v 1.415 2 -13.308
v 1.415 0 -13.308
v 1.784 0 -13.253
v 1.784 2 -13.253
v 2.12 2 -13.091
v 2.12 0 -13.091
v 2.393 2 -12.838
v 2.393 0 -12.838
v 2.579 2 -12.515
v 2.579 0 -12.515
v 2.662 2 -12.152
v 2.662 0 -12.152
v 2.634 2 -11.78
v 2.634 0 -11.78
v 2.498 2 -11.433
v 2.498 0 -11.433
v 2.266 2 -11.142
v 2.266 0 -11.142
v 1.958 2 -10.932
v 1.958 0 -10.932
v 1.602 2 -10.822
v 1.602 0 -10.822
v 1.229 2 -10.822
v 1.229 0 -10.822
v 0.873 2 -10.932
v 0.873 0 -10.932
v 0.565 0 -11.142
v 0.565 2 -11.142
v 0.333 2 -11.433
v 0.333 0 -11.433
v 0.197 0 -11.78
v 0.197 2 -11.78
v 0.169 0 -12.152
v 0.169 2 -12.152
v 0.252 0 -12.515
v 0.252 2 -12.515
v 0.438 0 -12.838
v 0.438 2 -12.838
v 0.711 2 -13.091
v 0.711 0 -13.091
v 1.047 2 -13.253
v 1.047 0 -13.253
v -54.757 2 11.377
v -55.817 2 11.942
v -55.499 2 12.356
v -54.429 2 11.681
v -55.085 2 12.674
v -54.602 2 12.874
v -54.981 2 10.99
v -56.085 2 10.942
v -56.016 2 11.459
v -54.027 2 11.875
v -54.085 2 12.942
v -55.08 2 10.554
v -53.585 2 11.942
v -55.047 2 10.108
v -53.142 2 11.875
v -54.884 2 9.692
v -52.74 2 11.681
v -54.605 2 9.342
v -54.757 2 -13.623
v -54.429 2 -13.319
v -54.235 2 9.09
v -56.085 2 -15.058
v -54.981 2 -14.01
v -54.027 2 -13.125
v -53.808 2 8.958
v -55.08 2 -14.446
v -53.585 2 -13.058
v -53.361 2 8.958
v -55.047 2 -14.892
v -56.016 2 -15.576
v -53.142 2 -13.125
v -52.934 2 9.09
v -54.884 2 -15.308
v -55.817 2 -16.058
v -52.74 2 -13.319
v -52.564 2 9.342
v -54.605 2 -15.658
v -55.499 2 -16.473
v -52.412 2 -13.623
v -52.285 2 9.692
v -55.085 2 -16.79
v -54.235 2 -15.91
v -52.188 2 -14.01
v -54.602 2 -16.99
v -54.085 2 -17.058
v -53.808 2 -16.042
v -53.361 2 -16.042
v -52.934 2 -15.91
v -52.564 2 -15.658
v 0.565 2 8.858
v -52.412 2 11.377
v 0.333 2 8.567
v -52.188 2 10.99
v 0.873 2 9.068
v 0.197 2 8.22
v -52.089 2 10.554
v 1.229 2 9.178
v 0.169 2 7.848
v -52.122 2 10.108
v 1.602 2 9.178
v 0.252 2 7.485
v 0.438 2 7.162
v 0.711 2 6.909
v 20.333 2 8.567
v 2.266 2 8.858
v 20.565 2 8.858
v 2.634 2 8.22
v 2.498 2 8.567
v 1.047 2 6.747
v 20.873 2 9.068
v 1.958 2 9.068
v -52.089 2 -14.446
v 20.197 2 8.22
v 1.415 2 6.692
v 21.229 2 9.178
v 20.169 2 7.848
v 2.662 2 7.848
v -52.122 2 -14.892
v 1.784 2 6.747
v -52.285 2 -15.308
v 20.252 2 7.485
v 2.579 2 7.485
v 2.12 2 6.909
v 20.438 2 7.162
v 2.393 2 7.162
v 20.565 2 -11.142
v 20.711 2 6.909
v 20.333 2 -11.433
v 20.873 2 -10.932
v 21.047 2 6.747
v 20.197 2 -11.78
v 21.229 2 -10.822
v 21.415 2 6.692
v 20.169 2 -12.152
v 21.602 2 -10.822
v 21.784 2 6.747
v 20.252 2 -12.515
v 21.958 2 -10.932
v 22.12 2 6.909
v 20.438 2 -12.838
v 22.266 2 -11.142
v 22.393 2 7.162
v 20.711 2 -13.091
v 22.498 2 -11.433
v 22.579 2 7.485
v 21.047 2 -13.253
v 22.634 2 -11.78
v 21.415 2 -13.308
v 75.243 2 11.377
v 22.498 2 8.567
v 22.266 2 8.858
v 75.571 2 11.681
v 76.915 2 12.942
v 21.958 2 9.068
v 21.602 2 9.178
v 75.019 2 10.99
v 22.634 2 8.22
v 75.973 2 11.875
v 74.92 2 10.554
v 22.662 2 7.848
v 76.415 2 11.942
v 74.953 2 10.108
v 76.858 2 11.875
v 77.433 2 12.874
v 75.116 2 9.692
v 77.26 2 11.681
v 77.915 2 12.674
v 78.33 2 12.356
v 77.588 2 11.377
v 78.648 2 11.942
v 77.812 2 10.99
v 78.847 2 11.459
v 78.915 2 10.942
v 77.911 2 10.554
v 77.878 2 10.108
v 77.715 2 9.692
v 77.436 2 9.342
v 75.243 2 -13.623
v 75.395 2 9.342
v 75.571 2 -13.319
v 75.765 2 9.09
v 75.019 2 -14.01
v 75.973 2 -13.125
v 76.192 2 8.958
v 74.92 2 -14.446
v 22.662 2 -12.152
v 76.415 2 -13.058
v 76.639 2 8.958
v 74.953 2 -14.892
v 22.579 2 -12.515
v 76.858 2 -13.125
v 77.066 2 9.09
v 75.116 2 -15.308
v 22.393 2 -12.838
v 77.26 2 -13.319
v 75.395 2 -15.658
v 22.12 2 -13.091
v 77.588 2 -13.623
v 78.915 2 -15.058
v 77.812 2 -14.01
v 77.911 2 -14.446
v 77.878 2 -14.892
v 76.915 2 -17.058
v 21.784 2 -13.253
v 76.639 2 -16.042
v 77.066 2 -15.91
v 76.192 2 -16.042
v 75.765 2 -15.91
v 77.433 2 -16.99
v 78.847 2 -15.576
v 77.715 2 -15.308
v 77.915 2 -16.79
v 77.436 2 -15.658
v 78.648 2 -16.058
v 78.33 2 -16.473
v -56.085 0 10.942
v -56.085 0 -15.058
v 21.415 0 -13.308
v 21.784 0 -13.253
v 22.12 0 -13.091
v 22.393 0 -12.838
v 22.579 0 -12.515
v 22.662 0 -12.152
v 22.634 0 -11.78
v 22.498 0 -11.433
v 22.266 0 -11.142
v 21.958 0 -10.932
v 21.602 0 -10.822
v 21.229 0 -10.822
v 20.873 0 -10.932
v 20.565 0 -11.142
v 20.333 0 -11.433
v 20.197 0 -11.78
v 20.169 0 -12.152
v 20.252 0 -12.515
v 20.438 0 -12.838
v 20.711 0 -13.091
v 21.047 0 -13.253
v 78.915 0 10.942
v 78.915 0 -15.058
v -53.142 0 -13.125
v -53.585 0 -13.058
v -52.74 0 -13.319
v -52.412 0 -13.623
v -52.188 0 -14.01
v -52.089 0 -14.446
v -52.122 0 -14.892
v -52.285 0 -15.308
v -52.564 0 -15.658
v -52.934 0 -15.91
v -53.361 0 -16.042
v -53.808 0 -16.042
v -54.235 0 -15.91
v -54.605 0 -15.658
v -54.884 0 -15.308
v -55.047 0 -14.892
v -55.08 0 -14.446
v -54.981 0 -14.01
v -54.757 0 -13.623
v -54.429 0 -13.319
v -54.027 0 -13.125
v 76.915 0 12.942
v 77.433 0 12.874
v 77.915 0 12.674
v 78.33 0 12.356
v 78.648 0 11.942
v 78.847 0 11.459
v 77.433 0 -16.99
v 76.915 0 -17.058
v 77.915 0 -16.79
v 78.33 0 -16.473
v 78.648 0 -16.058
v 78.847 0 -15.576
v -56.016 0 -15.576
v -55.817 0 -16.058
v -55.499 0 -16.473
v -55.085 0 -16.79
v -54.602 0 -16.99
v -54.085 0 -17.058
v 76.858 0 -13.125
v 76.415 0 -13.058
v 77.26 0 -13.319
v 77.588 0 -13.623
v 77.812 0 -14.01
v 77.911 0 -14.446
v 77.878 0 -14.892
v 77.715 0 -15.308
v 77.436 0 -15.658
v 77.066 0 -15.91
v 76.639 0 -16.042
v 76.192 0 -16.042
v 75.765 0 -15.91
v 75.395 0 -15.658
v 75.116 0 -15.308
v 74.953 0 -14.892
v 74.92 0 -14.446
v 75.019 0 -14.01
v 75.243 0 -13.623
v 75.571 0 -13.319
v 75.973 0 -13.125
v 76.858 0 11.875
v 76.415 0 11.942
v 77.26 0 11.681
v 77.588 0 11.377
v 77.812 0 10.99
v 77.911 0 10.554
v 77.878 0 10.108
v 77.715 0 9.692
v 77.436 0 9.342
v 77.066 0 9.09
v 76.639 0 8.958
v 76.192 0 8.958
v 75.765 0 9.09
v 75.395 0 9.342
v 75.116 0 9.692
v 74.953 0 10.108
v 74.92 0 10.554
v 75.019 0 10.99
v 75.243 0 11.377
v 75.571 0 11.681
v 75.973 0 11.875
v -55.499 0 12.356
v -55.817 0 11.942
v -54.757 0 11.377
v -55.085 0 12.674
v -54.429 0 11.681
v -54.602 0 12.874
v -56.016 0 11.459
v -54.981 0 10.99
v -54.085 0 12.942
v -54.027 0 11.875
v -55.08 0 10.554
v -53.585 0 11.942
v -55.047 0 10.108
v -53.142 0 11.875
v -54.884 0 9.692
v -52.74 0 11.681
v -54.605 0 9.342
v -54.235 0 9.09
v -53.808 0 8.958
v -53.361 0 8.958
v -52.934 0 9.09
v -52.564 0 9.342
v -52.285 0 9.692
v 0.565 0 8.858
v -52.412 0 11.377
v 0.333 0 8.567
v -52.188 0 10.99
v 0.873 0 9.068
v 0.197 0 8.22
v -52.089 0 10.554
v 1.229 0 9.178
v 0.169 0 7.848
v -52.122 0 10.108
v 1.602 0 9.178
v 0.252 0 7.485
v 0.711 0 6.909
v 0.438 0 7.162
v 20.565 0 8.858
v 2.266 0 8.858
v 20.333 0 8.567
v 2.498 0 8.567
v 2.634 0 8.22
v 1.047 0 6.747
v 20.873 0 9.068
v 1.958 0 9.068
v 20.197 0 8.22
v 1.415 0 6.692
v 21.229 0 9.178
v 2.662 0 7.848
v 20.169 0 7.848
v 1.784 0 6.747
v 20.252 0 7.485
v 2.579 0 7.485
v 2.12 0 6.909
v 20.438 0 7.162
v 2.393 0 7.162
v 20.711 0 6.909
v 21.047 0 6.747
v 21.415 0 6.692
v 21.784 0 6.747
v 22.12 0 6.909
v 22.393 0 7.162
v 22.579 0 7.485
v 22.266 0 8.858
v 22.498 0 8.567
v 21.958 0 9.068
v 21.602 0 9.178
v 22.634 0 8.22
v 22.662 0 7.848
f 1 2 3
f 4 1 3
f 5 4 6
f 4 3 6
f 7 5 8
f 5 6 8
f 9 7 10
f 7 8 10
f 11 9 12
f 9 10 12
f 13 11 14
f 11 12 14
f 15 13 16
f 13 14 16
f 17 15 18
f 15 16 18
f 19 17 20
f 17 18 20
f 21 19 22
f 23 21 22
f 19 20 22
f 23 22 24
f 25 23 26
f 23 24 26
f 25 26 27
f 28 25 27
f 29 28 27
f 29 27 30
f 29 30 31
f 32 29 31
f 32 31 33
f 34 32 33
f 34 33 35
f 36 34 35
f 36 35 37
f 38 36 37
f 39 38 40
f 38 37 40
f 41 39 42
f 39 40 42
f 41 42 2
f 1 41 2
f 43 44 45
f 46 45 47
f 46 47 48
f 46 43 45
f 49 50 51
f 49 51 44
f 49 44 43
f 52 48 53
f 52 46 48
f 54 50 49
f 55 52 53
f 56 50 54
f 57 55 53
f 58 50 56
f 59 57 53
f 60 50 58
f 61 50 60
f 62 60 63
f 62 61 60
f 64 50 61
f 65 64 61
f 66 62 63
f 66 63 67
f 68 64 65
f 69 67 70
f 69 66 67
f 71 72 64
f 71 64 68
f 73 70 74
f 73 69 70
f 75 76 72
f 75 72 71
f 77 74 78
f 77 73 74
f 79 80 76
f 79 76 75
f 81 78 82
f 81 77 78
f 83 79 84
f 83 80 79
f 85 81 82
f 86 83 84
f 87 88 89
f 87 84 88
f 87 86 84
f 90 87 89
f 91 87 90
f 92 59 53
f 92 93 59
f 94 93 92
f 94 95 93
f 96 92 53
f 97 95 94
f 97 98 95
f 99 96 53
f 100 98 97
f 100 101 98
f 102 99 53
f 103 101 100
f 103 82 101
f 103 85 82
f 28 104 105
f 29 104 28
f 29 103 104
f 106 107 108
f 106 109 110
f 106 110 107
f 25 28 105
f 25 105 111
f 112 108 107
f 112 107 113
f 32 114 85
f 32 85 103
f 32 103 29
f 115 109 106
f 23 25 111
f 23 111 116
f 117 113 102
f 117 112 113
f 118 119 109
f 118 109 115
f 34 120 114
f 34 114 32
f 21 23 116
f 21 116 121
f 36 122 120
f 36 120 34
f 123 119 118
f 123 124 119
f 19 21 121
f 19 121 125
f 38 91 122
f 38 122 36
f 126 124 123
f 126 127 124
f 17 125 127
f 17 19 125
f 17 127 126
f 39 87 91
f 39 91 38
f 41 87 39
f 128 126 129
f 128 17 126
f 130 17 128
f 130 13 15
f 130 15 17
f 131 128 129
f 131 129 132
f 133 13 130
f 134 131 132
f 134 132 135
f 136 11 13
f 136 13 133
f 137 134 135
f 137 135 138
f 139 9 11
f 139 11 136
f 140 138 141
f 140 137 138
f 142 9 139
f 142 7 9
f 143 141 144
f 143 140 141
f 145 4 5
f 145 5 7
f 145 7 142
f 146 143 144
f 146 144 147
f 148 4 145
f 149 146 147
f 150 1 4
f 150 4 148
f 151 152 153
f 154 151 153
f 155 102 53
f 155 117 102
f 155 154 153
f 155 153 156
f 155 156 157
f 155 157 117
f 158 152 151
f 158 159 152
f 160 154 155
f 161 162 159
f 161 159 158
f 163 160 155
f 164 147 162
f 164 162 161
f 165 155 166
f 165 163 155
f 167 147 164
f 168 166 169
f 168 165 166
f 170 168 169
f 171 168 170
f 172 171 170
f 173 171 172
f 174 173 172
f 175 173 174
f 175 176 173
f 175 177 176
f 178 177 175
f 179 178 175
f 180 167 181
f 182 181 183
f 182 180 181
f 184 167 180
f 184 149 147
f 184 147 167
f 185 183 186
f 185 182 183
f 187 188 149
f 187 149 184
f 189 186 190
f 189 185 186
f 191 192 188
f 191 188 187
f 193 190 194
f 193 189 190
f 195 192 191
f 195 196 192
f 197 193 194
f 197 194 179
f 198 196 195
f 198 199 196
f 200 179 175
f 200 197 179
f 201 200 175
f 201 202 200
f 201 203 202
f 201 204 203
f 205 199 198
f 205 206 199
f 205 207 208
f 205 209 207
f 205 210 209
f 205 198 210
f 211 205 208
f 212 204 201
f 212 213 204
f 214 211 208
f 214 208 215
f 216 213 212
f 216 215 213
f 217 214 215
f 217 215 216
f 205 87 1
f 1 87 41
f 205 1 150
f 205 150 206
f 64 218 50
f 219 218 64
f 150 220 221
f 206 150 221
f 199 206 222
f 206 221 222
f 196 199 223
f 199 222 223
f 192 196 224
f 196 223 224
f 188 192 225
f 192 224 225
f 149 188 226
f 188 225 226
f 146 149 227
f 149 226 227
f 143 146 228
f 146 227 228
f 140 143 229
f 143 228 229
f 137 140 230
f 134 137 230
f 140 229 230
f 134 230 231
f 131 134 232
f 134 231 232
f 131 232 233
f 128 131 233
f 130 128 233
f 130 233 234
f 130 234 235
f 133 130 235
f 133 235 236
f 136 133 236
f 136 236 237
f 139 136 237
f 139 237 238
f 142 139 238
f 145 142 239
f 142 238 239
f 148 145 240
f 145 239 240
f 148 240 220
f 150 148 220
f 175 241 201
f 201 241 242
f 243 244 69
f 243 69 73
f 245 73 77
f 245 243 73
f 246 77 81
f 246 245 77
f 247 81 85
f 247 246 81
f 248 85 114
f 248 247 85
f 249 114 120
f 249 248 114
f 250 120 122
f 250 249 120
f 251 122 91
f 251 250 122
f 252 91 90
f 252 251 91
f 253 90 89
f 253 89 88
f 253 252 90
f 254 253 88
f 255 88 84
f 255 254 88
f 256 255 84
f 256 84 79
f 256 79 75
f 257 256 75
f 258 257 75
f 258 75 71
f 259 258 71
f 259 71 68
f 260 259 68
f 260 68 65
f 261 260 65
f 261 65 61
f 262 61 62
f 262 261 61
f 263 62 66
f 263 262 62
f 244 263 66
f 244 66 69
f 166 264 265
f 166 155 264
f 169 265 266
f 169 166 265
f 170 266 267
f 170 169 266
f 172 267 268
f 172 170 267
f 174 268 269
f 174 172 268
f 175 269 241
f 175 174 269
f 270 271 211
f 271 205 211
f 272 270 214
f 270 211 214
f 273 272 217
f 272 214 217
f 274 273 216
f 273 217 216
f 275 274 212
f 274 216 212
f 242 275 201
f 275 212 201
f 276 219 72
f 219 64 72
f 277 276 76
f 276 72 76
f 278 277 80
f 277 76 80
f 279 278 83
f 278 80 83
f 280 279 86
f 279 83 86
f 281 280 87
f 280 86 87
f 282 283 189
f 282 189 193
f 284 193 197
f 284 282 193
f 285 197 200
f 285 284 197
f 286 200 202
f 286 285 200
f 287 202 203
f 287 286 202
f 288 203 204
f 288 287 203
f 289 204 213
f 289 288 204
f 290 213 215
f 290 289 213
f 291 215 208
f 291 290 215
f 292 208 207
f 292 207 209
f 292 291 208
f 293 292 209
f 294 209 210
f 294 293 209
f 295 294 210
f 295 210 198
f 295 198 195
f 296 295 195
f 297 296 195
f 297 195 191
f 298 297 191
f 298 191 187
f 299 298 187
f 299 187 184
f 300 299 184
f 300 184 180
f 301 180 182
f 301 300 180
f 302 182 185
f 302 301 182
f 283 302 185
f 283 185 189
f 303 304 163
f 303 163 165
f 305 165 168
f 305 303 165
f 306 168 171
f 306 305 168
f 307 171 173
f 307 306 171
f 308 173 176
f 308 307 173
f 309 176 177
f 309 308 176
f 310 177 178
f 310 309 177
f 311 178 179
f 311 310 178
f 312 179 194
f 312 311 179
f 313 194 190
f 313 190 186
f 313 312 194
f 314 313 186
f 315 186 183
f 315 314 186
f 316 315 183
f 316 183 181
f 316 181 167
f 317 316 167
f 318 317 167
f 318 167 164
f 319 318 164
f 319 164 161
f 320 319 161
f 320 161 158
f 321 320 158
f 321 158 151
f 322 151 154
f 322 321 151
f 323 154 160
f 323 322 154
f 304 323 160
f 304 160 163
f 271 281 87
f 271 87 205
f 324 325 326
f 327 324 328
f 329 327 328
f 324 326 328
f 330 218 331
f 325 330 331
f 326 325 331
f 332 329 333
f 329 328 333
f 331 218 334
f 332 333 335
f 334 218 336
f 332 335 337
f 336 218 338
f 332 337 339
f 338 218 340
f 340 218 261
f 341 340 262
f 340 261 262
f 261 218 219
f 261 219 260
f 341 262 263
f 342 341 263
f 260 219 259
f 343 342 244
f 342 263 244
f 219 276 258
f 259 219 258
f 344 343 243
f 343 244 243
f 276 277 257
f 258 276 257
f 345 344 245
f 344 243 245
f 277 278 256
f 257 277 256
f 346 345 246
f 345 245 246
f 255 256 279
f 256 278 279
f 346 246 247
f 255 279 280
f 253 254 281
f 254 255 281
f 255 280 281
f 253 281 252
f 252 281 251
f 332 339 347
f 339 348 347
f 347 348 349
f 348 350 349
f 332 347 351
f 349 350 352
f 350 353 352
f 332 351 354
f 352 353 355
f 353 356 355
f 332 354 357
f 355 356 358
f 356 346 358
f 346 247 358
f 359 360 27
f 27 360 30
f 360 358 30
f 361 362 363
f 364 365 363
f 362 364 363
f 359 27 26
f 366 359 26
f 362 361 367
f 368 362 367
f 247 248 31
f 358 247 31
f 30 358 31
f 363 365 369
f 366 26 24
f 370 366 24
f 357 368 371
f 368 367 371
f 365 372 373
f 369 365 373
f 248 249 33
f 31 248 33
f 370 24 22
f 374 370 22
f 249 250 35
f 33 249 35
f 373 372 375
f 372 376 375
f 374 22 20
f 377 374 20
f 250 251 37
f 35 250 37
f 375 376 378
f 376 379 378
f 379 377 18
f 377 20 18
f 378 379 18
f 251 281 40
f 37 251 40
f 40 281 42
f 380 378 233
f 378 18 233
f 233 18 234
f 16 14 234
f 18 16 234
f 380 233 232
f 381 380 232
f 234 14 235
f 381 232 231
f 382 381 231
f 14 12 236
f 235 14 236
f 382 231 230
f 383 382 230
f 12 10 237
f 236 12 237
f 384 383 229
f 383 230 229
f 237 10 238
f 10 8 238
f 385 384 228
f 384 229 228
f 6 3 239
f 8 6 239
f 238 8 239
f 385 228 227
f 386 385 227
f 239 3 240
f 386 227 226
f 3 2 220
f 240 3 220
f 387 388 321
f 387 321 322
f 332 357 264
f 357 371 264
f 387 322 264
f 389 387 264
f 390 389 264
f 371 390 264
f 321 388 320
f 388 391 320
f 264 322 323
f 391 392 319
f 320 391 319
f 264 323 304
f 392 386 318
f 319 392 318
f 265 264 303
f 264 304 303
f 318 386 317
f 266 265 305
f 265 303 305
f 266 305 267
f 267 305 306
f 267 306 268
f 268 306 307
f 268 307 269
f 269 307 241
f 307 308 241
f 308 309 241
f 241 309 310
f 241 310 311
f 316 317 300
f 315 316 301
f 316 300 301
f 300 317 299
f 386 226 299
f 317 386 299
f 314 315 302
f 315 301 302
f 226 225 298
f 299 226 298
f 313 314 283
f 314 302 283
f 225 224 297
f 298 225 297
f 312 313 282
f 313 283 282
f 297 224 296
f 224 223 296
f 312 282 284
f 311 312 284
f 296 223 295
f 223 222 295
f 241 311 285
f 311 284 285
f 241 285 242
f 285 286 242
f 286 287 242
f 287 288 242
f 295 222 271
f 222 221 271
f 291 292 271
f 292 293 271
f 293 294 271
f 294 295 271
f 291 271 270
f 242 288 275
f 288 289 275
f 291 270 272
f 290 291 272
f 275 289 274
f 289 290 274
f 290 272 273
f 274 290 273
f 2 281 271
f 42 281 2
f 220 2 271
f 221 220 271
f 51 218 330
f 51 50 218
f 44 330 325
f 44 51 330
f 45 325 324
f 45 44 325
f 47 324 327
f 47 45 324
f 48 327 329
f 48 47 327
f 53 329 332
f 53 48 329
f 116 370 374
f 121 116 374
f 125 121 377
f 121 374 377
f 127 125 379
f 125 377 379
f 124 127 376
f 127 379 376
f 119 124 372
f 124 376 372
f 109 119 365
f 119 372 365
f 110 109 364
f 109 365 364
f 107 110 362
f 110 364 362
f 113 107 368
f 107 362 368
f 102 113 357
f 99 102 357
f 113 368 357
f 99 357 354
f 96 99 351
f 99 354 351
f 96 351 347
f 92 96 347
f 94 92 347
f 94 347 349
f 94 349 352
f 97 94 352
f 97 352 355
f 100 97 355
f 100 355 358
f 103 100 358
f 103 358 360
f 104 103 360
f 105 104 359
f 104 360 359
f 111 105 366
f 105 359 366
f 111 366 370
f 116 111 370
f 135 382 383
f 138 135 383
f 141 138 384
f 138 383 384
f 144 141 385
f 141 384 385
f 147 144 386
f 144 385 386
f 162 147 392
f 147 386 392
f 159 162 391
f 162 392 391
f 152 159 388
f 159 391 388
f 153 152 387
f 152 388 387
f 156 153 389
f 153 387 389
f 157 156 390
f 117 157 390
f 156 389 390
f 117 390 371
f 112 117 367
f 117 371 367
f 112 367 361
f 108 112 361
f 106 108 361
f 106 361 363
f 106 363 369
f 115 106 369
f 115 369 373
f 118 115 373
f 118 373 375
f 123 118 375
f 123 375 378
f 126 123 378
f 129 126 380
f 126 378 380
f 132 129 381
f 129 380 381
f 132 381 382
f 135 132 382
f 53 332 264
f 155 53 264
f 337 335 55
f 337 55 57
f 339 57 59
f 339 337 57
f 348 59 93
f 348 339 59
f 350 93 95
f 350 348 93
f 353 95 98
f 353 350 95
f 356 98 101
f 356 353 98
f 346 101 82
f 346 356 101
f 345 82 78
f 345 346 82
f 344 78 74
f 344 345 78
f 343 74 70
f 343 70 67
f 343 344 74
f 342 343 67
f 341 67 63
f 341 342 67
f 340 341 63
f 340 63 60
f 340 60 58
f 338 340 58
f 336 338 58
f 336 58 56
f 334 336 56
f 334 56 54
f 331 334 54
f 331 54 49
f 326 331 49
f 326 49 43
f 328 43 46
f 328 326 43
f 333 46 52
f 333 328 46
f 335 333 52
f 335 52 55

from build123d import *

# Parameters (mm, degrees)
SKETCH_1_W          = 135
SKETCH_1_H          = 30
SKETCH_1_R          = 1.5
EXTRUDE_1_DEPTH     = 2
FILLET_1_R          = 2
SKETCH_2_R          = 1.25
CUT_EXTRUDE_1_DEPTH = 2


with BuildPart() as part:
    # 草图1 → 凸台-拉伸1 (new body)
    with BuildSketch(Plane(origin=(0, 0, 0), x_dir=(1, 0, 0), z_dir=(0, 1, 0))):
        with Locations((11.415492739, 2.058344197)):
            Rectangle(SKETCH_1_W, SKETCH_1_H)
        with Locations(Location((-53.584507261, 14.558344197, 0), (0, 0, 270))):
            Circle(SKETCH_1_R, mode=Mode.SUBTRACT)
        with Locations(Location((-53.584507261, -10.441655803, 0), (0, 0, 270))):
            Circle(SKETCH_1_R, mode=Mode.SUBTRACT)
        with Locations(Location((76.415492739, 14.558344197, 0), (0, 0, 270))):
            Circle(SKETCH_1_R, mode=Mode.SUBTRACT)
        with Locations(Location((76.415492739, -10.441655803, 0), (0, 0, 270))):
            Circle(SKETCH_1_R, mode=Mode.SUBTRACT)
    extrude(amount=EXTRUDE_1_DEPTH)

    # 圆角1
    fillet_1_edges = [part.edges().sort_by_distance(p)[0] for p in [
        (-56.084507261, 1, -17.058344197),
        (78.915492739, 1, -17.058344197),
        (78.915492739, 1, 12.941655803),
        (-56.084507261, 1, 12.941655803),
    ]]
    fillet(fillet_1_edges, radius=FILLET_1_R)

    # 草图2 → 切除-拉伸1 (cut)
    with BuildSketch(Plane.XZ):
        with Locations(Location((1.415492739, 7.941655803, 0), (0, 0, 270))):
            Circle(SKETCH_2_R)
        with Locations(Location((21.415492739, 7.941655803, 0), (0, 0, 270))):
            Circle(SKETCH_2_R)
        with Locations(Location((1.415492739, -12.058344197, 0), (0, 0, 270))):
            Circle(SKETCH_2_R)
        with Locations(Location((21.415492739, -12.058344197, 0), (0, 0, 270))):
            Circle(SKETCH_2_R)
    extrude(amount=-CUT_EXTRUDE_1_DEPTH, mode=Mode.SUBTRACT)


solid = part.part
